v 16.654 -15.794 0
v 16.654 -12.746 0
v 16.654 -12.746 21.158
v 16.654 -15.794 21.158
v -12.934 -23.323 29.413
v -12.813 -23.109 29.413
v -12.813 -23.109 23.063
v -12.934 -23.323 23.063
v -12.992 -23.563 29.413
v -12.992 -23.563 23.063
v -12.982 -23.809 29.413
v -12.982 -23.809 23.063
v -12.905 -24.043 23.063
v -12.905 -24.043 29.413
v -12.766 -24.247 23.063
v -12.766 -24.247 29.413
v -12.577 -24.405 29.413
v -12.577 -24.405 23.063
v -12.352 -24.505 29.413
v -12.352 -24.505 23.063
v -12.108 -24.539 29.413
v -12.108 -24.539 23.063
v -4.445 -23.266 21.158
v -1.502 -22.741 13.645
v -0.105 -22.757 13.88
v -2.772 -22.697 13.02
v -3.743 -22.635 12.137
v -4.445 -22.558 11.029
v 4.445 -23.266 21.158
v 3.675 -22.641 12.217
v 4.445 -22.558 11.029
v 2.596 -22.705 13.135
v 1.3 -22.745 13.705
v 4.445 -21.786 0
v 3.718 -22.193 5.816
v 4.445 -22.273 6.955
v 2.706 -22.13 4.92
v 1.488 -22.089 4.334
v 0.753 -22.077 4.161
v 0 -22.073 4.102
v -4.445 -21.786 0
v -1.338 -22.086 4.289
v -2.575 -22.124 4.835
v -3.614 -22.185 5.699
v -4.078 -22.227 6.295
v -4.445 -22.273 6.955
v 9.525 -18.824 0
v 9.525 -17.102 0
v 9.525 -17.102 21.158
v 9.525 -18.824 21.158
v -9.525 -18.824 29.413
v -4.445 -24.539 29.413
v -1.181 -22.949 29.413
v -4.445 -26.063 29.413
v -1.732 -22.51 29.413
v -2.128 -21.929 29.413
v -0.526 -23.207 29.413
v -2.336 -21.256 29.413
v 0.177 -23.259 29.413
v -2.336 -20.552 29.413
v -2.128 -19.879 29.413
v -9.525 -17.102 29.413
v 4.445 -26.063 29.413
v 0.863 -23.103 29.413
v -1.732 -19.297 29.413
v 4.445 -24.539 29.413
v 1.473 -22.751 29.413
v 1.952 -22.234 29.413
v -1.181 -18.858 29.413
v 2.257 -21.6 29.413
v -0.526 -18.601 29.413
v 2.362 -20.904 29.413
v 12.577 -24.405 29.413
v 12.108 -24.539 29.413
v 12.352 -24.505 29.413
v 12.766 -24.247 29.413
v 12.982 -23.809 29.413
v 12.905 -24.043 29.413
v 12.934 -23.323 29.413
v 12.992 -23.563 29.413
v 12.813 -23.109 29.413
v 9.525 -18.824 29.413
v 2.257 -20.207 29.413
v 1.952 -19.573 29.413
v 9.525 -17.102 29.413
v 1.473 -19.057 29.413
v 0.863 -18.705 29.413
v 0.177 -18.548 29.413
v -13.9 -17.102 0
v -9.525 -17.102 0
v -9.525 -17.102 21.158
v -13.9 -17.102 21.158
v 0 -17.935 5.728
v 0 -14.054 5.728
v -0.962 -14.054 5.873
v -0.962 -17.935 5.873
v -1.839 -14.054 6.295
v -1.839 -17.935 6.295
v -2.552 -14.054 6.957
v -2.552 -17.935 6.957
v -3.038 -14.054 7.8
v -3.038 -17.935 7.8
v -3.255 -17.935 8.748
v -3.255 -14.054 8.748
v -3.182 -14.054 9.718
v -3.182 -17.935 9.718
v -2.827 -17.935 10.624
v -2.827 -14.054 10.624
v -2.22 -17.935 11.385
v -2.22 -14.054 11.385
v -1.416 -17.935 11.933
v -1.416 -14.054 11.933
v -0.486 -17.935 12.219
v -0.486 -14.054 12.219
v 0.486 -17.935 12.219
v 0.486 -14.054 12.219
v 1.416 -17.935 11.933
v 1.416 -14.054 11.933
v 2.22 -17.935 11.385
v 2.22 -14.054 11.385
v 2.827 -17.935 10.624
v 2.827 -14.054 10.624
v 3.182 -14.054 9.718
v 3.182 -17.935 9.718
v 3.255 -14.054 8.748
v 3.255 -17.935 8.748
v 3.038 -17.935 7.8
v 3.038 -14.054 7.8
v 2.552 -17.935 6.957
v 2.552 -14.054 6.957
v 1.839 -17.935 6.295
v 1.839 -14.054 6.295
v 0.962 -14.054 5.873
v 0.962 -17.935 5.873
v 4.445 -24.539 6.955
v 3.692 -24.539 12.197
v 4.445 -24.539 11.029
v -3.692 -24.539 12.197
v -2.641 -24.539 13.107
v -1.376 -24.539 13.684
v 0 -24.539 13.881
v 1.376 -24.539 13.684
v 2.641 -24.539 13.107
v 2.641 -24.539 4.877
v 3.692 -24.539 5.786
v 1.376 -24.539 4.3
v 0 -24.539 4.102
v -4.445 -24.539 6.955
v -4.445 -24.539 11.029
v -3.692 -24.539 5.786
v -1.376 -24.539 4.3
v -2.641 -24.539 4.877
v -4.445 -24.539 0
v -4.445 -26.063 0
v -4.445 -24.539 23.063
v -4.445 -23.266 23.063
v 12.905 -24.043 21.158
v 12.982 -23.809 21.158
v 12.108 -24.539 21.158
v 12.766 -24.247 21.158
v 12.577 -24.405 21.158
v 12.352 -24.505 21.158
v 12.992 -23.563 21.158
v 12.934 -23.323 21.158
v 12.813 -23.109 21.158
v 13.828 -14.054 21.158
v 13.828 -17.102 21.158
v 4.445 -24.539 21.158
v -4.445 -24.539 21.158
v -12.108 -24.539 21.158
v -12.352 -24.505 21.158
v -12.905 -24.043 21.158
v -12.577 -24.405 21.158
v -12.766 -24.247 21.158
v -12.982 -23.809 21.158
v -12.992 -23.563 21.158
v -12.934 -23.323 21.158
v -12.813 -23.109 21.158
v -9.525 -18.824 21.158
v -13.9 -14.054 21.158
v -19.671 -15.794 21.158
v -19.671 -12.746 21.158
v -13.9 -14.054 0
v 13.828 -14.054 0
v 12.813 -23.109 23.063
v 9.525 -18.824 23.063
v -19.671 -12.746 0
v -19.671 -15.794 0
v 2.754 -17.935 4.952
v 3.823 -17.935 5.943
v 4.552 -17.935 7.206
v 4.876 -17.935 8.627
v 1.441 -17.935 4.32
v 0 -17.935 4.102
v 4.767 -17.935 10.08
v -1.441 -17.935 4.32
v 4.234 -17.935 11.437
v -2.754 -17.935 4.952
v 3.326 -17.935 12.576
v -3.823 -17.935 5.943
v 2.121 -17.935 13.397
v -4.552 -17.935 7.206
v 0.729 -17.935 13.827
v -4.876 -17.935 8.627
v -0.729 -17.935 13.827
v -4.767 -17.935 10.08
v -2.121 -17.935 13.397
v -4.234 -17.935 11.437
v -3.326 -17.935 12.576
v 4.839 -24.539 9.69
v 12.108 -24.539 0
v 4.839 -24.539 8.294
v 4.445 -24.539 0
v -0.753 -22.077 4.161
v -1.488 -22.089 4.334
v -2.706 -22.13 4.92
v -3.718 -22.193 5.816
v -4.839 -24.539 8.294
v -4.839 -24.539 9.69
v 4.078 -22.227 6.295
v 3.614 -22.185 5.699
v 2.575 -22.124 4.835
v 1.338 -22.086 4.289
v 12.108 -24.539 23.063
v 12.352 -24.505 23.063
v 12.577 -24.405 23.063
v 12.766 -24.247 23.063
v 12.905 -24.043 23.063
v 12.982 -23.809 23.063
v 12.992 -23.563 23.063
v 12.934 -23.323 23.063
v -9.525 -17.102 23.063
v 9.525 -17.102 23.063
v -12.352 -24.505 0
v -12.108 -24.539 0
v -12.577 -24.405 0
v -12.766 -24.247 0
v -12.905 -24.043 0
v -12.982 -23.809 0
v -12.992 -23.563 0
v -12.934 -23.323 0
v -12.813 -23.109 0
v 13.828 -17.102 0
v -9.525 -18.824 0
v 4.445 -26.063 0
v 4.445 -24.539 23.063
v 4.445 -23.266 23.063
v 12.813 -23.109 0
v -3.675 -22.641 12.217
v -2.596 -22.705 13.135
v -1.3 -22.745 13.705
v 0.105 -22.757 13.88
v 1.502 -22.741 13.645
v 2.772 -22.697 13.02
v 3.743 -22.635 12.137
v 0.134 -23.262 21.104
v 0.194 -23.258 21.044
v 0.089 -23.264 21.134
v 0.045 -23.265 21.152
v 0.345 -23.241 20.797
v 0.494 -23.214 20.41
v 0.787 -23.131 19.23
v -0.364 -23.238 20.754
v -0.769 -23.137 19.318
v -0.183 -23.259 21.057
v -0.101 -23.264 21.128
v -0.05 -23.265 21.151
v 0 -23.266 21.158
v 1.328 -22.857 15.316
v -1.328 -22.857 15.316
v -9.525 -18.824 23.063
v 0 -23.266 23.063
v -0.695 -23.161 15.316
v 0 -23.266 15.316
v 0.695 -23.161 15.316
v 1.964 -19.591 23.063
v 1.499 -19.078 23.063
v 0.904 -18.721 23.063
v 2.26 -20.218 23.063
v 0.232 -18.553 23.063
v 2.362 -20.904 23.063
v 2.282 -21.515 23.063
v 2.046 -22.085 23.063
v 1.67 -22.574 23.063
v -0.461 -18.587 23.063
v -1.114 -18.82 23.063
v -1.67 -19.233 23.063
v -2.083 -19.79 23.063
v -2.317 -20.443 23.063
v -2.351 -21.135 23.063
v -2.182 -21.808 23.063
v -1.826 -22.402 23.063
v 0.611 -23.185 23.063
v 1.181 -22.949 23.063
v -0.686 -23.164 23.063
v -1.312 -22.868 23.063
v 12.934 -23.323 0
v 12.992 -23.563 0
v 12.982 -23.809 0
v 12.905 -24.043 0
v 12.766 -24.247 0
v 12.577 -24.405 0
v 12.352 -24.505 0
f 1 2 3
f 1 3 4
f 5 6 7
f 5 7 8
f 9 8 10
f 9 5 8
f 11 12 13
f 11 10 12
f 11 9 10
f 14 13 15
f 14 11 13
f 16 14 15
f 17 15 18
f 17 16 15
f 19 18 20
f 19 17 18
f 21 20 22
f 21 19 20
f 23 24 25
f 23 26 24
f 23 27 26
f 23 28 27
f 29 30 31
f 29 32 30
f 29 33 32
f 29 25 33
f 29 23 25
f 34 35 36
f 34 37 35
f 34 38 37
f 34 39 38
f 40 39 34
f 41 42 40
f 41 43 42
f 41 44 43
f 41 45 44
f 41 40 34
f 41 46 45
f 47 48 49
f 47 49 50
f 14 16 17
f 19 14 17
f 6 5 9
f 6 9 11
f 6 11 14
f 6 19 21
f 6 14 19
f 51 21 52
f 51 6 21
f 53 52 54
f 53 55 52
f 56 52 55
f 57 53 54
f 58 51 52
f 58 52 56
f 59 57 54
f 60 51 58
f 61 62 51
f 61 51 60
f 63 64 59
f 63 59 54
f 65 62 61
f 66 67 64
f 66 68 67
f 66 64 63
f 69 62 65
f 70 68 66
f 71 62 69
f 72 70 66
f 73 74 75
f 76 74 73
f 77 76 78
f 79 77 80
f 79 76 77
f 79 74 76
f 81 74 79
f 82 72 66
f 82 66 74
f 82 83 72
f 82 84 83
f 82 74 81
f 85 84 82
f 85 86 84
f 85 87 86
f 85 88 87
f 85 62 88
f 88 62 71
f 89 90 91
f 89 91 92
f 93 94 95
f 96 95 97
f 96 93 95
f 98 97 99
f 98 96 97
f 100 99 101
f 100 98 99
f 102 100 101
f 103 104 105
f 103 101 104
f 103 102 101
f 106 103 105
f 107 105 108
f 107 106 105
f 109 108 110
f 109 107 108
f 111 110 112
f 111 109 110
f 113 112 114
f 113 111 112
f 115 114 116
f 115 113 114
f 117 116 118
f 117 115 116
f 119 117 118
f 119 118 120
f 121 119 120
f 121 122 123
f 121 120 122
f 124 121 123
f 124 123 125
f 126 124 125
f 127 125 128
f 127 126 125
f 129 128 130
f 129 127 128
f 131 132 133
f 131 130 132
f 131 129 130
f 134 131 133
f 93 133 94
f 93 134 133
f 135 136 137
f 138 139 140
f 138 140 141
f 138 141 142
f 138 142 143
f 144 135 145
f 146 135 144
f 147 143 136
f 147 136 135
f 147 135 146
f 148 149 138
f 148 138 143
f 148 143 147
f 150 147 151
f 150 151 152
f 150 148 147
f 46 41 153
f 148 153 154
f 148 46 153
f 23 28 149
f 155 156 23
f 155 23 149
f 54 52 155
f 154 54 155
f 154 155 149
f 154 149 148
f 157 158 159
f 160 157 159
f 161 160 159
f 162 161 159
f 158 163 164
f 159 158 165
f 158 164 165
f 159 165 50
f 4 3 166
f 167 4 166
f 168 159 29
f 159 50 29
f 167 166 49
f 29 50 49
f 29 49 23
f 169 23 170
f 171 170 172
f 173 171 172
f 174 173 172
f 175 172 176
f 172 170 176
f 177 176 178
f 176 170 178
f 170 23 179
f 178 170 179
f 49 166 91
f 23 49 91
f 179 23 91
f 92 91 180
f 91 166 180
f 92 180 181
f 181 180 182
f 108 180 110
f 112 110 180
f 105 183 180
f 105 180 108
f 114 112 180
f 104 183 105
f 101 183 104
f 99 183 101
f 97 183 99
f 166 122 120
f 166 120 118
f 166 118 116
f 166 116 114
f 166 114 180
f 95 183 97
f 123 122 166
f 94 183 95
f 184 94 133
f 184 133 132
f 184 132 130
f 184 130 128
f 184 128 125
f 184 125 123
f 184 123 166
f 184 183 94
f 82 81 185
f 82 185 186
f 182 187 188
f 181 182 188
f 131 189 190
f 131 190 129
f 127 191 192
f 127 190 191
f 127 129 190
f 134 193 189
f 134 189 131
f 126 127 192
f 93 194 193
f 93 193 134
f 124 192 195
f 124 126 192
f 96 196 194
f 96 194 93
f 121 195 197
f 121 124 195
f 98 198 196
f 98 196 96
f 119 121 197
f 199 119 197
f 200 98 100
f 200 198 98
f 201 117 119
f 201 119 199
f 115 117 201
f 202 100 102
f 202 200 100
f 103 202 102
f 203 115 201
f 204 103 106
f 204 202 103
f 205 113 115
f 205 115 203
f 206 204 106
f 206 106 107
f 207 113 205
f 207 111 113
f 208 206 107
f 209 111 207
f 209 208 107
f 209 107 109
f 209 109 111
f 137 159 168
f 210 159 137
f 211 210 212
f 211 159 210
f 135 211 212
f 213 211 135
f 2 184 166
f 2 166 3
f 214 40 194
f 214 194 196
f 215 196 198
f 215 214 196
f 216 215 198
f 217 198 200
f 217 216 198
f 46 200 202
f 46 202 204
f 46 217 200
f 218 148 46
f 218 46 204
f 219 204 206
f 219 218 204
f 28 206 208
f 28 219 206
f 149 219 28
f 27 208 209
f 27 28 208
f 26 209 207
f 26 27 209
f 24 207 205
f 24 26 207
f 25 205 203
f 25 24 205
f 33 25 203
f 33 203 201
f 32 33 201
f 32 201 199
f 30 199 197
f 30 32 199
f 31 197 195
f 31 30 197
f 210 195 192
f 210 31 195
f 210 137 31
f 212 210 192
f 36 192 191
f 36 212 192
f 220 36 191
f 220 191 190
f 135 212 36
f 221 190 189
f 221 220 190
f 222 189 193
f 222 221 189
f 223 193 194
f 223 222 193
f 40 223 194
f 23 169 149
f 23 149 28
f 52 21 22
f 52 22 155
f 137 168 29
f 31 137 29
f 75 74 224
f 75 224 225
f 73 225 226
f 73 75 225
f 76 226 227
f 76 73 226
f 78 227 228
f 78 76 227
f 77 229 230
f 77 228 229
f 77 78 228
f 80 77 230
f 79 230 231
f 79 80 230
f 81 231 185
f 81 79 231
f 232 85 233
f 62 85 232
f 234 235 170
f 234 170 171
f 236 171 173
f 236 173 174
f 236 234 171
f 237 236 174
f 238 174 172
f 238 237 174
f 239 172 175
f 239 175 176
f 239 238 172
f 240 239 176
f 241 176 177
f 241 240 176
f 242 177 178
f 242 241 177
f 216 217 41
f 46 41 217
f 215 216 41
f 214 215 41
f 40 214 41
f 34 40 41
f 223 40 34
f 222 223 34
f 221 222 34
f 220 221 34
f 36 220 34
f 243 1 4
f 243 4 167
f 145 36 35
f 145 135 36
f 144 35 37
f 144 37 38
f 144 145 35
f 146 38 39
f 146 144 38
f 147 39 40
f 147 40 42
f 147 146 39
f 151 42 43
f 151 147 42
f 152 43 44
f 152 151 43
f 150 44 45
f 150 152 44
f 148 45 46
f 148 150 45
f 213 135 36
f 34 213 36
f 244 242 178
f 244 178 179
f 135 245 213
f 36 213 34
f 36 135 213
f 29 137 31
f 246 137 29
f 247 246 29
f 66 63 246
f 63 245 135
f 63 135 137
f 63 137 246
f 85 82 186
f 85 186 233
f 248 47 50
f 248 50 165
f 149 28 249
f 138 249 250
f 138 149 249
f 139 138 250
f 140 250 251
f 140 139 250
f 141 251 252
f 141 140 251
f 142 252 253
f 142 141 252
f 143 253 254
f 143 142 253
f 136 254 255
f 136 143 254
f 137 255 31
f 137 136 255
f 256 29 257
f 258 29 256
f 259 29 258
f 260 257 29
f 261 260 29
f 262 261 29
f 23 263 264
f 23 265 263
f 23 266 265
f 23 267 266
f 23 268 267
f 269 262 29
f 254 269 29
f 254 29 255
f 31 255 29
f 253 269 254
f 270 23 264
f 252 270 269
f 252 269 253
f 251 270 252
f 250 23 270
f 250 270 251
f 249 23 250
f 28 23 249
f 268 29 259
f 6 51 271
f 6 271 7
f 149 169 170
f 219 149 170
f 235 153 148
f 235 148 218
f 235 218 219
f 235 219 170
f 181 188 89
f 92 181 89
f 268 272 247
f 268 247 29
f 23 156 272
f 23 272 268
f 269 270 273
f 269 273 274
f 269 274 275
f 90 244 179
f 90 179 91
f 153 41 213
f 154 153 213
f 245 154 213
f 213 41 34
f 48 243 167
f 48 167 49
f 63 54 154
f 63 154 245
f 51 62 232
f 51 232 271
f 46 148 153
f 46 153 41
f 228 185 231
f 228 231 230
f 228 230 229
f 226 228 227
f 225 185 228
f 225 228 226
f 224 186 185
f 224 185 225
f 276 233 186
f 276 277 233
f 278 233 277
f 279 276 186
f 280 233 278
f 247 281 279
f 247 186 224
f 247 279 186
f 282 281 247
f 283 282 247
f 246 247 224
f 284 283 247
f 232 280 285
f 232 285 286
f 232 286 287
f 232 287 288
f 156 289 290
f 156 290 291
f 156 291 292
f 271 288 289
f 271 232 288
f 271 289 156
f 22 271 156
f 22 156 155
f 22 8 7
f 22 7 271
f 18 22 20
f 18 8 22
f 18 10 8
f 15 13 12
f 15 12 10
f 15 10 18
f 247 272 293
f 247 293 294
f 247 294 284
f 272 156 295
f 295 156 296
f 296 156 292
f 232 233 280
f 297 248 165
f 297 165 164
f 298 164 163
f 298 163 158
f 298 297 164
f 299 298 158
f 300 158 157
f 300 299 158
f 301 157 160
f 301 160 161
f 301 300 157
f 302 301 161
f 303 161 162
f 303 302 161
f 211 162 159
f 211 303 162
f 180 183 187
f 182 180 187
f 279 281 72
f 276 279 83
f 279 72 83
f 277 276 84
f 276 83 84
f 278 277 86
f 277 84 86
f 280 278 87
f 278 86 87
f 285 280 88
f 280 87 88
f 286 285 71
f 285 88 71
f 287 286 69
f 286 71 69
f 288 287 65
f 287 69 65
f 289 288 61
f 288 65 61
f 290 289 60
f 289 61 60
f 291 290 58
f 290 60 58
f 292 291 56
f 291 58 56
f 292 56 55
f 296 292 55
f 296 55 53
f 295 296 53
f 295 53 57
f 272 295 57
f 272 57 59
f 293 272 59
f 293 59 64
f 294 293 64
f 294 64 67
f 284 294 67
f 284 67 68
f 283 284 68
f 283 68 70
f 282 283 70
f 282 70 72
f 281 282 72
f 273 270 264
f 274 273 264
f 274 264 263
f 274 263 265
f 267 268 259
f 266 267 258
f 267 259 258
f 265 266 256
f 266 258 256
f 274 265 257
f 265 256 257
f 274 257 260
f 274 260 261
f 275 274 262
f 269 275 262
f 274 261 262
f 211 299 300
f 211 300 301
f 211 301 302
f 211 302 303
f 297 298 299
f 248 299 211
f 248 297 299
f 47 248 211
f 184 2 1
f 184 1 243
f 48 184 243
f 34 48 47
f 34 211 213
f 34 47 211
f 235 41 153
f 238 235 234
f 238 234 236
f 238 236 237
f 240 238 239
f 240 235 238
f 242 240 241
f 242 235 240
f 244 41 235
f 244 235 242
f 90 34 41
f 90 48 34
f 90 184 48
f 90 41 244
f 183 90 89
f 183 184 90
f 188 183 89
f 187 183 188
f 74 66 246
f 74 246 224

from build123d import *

# Parameters (mm, degrees)
BOSS_EXTRUDE1_DEPTH      = 21.1582
SKETCH5_W                = 8.89
SKETCH5_H                = 6.35
CUT_EXTRUDE2_DEPTH       = 40
BOSS_EXTRUDE2_DEPTH      = 21.1582
BOSS_EXTRUDE2_DEPTH_BACK = 8.255
CUT_EXTRUDE3_DEPTH       = 44.94741167
CUT_EXTRUDE3_DEPTH_BACK  = 44.94741167
SKETCH9_W                = 9.686151671
SKETCH9_H                = 23.108692275
CUT_EXTRUDE4_DEPTH       = 14.097
SKETCH10_R               = 2.3622
CUT_EXTRUDE5_DEPTH       = 14.097


with BuildPart() as part:
    # Sketch1 → Boss-Extrude1 (new body)
    with BuildSketch(Plane.XY):
        with BuildLine():
            ThreePointArc((-12.107560068, -24.539011499), (-12.904879935, -24.043206145), (-12.812851187, -23.108822589))
            Line((-12.812851187, -23.108822589), (-9.525, -18.824011499))
            Line((-9.525, -18.824011499), (-9.525, -17.10150063))
            Line((-9.525, -17.10150063), (-13.899640283, -17.10150063))
            Line((-13.899640283, -17.10150063), (-13.899640283, -14.05350063))
            Line((-13.899640283, -14.05350063), (13.828023576, -14.05350063))
            Line((13.828023576, -14.05350063), (13.828023576, -17.10150063))
            Line((13.828023576, -17.10150063), (9.525, -17.10150063))
            Line((9.525, -17.10150063), (9.525, -18.824011499))
            Line((9.525, -18.824011499), (12.812851187, -23.108822589))
            ThreePointArc((12.812851187, -23.108822589), (12.904879935, -24.043206145), (12.107560068, -24.539011499))
            Line((12.107560068, -24.539011499), (-12.107560068, -24.539011499))
        make_face()
        Polygon((16.65409094, -15.794154454), (13.828023576, -17.10150063), (13.828023576, -14.05350063), (16.65409094, -12.746154454), align=None)
        Polygon((-19.671250338, -12.746154454), (-19.671250338, -15.794154454), (-13.899640283, -17.10150063), (-13.899640283, -14.05350063), align=None)
    extrude(amount=BOSS_EXTRUDE1_DEPTH)

    # Sketch5 → Cut-Extrude2 (cut)
    with BuildSketch(Plane(origin=(0, -1.591732139, 22.762830088), x_dir=(1, 0, 0), z_dir=(0, -0.06975647374412544, 0.9975640502598242))):
        with Locations((0, -24.908314278)):
            Rectangle(SKETCH5_W, SKETCH5_H)
    extrude(amount=-CUT_EXTRUDE2_DEPTH, mode=Mode.SUBTRACT)


with BuildPart() as body_2:
    # Sketch7 → Boss-Extrude2 (new, two sides: drawn at the far end of the back side and taken through both)
    with BuildSketch(Plane(origin=(0, 0, 21.1582), x_dir=(-1, 0, 0), z_dir=(0, 0, -1)).offset(-BOSS_EXTRUDE2_DEPTH_BACK)):
        with BuildLine():
            Line((-9.525, -17.10150063), (9.525, -17.10150063))
            Line((9.525, -17.10150063), (9.525, -18.824011499))
            Line((9.525, -18.824011499), (12.812851187, -23.108822589))
            ThreePointArc((12.812851187, -23.108822589), (12.904879935, -24.043206145), (12.107560068, -24.539011499))
            Line((12.107560068, -24.539011499), (4.445, -24.539011499))
            Line((4.445, -24.539011499), (4.445, -26.063011499))
            Line((4.445, -26.063011499), (-4.445, -26.063011499))
            Line((-4.445, -26.063011499), (-4.445, -24.539011499))
            Line((-4.445, -24.539011499), (-12.107560068, -24.539011499))
            ThreePointArc((-12.107560068, -24.539011499), (-12.904879935, -24.043206145), (-12.812851187, -23.108822589))
            Line((-12.812851187, -23.108822589), (-9.525, -18.824011499))
            Line((-9.525, -18.824011499), (-9.525, -17.10150063))
        make_face()
    extrude(amount=BOSS_EXTRUDE2_DEPTH + BOSS_EXTRUDE2_DEPTH_BACK)

    # Sketch8 → Cut-Extrude3 (cut, two sides: drawn at the far end of the back side and taken through both)
    with BuildSketch(Plane(origin=(0, 0, 0), x_dir=(0, 0, -1), z_dir=(1, 0, 0)).offset(-CUT_EXTRUDE3_DEPTH_BACK)):
        Polygon((-23.0632, -15.881909333), (-23.0632, -23.265910289), (-21.1582, -23.265910289), (3.175, -21.564367188), (3.175, -15.881909333), align=None)
    extrude(amount=CUT_EXTRUDE3_DEPTH + CUT_EXTRUDE3_DEPTH_BACK, mode=Mode.SUBTRACT)

    # Sketch9 → Cut-Extrude4 (cut)
    with BuildSketch(Plane.XZ.offset(24.539011499)):
        with Locations((-9.288075836, 11.508853863)):
            Rectangle(SKETCH9_W, SKETCH9_H)
        with Locations((9.288075836, 11.508853863)):
            Rectangle(SKETCH9_W, SKETCH9_H)
    extrude(amount=-CUT_EXTRUDE4_DEPTH, mode=Mode.SUBTRACT)

    # Sketch10 → Cut-Extrude5 (cut)
    with BuildSketch(Plane.XY.offset(29.4132)):
        with Locations((0, -20.903710289)):
            Circle(SKETCH10_R)
    extrude(amount=-CUT_EXTRUDE5_DEPTH, mode=Mode.SUBTRACT)


with BuildPart() as cbore_for_1_4_socket_head_cap_screw1_tool:
    # Sketch3 → CBORE for 1/4 Socket Head Cap Screw1 (revolve)
    with BuildSketch(Plane(origin=(0, -24.539011499, 8.991954404), x_dir=(0, 0, -1), z_dir=(1, 0, 0))):
        Polygon((0, 0), (0, 14.965948974), (3.2639, 13.0048), (3.2639, 6.604), (4.8895, 6.604), (4.8895, 0), align=None)
    revolve(axis=Axis((0, -30.889011499, 8.991954404), (0, 1, 0)))


with BuildPart() as part_1:
    add(part.part)

    # CBORE for 1/4 Socket Head Cap Screw1: cut by cbore_for_1_4_socket_head_cap_screw1_tool
    add(cbore_for_1_4_socket_head_cap_screw1_tool.part, mode=Mode.SUBTRACT)


with BuildPart() as body_2_1:
    add(body_2.part)

    # CBORE for 1/4 Socket Head Cap Screw1: cut by cbore_for_1_4_socket_head_cap_screw1_tool
    add(cbore_for_1_4_socket_head_cap_screw1_tool.part, mode=Mode.SUBTRACT)


solid = Compound([part_1.part, body_2_1.part])
